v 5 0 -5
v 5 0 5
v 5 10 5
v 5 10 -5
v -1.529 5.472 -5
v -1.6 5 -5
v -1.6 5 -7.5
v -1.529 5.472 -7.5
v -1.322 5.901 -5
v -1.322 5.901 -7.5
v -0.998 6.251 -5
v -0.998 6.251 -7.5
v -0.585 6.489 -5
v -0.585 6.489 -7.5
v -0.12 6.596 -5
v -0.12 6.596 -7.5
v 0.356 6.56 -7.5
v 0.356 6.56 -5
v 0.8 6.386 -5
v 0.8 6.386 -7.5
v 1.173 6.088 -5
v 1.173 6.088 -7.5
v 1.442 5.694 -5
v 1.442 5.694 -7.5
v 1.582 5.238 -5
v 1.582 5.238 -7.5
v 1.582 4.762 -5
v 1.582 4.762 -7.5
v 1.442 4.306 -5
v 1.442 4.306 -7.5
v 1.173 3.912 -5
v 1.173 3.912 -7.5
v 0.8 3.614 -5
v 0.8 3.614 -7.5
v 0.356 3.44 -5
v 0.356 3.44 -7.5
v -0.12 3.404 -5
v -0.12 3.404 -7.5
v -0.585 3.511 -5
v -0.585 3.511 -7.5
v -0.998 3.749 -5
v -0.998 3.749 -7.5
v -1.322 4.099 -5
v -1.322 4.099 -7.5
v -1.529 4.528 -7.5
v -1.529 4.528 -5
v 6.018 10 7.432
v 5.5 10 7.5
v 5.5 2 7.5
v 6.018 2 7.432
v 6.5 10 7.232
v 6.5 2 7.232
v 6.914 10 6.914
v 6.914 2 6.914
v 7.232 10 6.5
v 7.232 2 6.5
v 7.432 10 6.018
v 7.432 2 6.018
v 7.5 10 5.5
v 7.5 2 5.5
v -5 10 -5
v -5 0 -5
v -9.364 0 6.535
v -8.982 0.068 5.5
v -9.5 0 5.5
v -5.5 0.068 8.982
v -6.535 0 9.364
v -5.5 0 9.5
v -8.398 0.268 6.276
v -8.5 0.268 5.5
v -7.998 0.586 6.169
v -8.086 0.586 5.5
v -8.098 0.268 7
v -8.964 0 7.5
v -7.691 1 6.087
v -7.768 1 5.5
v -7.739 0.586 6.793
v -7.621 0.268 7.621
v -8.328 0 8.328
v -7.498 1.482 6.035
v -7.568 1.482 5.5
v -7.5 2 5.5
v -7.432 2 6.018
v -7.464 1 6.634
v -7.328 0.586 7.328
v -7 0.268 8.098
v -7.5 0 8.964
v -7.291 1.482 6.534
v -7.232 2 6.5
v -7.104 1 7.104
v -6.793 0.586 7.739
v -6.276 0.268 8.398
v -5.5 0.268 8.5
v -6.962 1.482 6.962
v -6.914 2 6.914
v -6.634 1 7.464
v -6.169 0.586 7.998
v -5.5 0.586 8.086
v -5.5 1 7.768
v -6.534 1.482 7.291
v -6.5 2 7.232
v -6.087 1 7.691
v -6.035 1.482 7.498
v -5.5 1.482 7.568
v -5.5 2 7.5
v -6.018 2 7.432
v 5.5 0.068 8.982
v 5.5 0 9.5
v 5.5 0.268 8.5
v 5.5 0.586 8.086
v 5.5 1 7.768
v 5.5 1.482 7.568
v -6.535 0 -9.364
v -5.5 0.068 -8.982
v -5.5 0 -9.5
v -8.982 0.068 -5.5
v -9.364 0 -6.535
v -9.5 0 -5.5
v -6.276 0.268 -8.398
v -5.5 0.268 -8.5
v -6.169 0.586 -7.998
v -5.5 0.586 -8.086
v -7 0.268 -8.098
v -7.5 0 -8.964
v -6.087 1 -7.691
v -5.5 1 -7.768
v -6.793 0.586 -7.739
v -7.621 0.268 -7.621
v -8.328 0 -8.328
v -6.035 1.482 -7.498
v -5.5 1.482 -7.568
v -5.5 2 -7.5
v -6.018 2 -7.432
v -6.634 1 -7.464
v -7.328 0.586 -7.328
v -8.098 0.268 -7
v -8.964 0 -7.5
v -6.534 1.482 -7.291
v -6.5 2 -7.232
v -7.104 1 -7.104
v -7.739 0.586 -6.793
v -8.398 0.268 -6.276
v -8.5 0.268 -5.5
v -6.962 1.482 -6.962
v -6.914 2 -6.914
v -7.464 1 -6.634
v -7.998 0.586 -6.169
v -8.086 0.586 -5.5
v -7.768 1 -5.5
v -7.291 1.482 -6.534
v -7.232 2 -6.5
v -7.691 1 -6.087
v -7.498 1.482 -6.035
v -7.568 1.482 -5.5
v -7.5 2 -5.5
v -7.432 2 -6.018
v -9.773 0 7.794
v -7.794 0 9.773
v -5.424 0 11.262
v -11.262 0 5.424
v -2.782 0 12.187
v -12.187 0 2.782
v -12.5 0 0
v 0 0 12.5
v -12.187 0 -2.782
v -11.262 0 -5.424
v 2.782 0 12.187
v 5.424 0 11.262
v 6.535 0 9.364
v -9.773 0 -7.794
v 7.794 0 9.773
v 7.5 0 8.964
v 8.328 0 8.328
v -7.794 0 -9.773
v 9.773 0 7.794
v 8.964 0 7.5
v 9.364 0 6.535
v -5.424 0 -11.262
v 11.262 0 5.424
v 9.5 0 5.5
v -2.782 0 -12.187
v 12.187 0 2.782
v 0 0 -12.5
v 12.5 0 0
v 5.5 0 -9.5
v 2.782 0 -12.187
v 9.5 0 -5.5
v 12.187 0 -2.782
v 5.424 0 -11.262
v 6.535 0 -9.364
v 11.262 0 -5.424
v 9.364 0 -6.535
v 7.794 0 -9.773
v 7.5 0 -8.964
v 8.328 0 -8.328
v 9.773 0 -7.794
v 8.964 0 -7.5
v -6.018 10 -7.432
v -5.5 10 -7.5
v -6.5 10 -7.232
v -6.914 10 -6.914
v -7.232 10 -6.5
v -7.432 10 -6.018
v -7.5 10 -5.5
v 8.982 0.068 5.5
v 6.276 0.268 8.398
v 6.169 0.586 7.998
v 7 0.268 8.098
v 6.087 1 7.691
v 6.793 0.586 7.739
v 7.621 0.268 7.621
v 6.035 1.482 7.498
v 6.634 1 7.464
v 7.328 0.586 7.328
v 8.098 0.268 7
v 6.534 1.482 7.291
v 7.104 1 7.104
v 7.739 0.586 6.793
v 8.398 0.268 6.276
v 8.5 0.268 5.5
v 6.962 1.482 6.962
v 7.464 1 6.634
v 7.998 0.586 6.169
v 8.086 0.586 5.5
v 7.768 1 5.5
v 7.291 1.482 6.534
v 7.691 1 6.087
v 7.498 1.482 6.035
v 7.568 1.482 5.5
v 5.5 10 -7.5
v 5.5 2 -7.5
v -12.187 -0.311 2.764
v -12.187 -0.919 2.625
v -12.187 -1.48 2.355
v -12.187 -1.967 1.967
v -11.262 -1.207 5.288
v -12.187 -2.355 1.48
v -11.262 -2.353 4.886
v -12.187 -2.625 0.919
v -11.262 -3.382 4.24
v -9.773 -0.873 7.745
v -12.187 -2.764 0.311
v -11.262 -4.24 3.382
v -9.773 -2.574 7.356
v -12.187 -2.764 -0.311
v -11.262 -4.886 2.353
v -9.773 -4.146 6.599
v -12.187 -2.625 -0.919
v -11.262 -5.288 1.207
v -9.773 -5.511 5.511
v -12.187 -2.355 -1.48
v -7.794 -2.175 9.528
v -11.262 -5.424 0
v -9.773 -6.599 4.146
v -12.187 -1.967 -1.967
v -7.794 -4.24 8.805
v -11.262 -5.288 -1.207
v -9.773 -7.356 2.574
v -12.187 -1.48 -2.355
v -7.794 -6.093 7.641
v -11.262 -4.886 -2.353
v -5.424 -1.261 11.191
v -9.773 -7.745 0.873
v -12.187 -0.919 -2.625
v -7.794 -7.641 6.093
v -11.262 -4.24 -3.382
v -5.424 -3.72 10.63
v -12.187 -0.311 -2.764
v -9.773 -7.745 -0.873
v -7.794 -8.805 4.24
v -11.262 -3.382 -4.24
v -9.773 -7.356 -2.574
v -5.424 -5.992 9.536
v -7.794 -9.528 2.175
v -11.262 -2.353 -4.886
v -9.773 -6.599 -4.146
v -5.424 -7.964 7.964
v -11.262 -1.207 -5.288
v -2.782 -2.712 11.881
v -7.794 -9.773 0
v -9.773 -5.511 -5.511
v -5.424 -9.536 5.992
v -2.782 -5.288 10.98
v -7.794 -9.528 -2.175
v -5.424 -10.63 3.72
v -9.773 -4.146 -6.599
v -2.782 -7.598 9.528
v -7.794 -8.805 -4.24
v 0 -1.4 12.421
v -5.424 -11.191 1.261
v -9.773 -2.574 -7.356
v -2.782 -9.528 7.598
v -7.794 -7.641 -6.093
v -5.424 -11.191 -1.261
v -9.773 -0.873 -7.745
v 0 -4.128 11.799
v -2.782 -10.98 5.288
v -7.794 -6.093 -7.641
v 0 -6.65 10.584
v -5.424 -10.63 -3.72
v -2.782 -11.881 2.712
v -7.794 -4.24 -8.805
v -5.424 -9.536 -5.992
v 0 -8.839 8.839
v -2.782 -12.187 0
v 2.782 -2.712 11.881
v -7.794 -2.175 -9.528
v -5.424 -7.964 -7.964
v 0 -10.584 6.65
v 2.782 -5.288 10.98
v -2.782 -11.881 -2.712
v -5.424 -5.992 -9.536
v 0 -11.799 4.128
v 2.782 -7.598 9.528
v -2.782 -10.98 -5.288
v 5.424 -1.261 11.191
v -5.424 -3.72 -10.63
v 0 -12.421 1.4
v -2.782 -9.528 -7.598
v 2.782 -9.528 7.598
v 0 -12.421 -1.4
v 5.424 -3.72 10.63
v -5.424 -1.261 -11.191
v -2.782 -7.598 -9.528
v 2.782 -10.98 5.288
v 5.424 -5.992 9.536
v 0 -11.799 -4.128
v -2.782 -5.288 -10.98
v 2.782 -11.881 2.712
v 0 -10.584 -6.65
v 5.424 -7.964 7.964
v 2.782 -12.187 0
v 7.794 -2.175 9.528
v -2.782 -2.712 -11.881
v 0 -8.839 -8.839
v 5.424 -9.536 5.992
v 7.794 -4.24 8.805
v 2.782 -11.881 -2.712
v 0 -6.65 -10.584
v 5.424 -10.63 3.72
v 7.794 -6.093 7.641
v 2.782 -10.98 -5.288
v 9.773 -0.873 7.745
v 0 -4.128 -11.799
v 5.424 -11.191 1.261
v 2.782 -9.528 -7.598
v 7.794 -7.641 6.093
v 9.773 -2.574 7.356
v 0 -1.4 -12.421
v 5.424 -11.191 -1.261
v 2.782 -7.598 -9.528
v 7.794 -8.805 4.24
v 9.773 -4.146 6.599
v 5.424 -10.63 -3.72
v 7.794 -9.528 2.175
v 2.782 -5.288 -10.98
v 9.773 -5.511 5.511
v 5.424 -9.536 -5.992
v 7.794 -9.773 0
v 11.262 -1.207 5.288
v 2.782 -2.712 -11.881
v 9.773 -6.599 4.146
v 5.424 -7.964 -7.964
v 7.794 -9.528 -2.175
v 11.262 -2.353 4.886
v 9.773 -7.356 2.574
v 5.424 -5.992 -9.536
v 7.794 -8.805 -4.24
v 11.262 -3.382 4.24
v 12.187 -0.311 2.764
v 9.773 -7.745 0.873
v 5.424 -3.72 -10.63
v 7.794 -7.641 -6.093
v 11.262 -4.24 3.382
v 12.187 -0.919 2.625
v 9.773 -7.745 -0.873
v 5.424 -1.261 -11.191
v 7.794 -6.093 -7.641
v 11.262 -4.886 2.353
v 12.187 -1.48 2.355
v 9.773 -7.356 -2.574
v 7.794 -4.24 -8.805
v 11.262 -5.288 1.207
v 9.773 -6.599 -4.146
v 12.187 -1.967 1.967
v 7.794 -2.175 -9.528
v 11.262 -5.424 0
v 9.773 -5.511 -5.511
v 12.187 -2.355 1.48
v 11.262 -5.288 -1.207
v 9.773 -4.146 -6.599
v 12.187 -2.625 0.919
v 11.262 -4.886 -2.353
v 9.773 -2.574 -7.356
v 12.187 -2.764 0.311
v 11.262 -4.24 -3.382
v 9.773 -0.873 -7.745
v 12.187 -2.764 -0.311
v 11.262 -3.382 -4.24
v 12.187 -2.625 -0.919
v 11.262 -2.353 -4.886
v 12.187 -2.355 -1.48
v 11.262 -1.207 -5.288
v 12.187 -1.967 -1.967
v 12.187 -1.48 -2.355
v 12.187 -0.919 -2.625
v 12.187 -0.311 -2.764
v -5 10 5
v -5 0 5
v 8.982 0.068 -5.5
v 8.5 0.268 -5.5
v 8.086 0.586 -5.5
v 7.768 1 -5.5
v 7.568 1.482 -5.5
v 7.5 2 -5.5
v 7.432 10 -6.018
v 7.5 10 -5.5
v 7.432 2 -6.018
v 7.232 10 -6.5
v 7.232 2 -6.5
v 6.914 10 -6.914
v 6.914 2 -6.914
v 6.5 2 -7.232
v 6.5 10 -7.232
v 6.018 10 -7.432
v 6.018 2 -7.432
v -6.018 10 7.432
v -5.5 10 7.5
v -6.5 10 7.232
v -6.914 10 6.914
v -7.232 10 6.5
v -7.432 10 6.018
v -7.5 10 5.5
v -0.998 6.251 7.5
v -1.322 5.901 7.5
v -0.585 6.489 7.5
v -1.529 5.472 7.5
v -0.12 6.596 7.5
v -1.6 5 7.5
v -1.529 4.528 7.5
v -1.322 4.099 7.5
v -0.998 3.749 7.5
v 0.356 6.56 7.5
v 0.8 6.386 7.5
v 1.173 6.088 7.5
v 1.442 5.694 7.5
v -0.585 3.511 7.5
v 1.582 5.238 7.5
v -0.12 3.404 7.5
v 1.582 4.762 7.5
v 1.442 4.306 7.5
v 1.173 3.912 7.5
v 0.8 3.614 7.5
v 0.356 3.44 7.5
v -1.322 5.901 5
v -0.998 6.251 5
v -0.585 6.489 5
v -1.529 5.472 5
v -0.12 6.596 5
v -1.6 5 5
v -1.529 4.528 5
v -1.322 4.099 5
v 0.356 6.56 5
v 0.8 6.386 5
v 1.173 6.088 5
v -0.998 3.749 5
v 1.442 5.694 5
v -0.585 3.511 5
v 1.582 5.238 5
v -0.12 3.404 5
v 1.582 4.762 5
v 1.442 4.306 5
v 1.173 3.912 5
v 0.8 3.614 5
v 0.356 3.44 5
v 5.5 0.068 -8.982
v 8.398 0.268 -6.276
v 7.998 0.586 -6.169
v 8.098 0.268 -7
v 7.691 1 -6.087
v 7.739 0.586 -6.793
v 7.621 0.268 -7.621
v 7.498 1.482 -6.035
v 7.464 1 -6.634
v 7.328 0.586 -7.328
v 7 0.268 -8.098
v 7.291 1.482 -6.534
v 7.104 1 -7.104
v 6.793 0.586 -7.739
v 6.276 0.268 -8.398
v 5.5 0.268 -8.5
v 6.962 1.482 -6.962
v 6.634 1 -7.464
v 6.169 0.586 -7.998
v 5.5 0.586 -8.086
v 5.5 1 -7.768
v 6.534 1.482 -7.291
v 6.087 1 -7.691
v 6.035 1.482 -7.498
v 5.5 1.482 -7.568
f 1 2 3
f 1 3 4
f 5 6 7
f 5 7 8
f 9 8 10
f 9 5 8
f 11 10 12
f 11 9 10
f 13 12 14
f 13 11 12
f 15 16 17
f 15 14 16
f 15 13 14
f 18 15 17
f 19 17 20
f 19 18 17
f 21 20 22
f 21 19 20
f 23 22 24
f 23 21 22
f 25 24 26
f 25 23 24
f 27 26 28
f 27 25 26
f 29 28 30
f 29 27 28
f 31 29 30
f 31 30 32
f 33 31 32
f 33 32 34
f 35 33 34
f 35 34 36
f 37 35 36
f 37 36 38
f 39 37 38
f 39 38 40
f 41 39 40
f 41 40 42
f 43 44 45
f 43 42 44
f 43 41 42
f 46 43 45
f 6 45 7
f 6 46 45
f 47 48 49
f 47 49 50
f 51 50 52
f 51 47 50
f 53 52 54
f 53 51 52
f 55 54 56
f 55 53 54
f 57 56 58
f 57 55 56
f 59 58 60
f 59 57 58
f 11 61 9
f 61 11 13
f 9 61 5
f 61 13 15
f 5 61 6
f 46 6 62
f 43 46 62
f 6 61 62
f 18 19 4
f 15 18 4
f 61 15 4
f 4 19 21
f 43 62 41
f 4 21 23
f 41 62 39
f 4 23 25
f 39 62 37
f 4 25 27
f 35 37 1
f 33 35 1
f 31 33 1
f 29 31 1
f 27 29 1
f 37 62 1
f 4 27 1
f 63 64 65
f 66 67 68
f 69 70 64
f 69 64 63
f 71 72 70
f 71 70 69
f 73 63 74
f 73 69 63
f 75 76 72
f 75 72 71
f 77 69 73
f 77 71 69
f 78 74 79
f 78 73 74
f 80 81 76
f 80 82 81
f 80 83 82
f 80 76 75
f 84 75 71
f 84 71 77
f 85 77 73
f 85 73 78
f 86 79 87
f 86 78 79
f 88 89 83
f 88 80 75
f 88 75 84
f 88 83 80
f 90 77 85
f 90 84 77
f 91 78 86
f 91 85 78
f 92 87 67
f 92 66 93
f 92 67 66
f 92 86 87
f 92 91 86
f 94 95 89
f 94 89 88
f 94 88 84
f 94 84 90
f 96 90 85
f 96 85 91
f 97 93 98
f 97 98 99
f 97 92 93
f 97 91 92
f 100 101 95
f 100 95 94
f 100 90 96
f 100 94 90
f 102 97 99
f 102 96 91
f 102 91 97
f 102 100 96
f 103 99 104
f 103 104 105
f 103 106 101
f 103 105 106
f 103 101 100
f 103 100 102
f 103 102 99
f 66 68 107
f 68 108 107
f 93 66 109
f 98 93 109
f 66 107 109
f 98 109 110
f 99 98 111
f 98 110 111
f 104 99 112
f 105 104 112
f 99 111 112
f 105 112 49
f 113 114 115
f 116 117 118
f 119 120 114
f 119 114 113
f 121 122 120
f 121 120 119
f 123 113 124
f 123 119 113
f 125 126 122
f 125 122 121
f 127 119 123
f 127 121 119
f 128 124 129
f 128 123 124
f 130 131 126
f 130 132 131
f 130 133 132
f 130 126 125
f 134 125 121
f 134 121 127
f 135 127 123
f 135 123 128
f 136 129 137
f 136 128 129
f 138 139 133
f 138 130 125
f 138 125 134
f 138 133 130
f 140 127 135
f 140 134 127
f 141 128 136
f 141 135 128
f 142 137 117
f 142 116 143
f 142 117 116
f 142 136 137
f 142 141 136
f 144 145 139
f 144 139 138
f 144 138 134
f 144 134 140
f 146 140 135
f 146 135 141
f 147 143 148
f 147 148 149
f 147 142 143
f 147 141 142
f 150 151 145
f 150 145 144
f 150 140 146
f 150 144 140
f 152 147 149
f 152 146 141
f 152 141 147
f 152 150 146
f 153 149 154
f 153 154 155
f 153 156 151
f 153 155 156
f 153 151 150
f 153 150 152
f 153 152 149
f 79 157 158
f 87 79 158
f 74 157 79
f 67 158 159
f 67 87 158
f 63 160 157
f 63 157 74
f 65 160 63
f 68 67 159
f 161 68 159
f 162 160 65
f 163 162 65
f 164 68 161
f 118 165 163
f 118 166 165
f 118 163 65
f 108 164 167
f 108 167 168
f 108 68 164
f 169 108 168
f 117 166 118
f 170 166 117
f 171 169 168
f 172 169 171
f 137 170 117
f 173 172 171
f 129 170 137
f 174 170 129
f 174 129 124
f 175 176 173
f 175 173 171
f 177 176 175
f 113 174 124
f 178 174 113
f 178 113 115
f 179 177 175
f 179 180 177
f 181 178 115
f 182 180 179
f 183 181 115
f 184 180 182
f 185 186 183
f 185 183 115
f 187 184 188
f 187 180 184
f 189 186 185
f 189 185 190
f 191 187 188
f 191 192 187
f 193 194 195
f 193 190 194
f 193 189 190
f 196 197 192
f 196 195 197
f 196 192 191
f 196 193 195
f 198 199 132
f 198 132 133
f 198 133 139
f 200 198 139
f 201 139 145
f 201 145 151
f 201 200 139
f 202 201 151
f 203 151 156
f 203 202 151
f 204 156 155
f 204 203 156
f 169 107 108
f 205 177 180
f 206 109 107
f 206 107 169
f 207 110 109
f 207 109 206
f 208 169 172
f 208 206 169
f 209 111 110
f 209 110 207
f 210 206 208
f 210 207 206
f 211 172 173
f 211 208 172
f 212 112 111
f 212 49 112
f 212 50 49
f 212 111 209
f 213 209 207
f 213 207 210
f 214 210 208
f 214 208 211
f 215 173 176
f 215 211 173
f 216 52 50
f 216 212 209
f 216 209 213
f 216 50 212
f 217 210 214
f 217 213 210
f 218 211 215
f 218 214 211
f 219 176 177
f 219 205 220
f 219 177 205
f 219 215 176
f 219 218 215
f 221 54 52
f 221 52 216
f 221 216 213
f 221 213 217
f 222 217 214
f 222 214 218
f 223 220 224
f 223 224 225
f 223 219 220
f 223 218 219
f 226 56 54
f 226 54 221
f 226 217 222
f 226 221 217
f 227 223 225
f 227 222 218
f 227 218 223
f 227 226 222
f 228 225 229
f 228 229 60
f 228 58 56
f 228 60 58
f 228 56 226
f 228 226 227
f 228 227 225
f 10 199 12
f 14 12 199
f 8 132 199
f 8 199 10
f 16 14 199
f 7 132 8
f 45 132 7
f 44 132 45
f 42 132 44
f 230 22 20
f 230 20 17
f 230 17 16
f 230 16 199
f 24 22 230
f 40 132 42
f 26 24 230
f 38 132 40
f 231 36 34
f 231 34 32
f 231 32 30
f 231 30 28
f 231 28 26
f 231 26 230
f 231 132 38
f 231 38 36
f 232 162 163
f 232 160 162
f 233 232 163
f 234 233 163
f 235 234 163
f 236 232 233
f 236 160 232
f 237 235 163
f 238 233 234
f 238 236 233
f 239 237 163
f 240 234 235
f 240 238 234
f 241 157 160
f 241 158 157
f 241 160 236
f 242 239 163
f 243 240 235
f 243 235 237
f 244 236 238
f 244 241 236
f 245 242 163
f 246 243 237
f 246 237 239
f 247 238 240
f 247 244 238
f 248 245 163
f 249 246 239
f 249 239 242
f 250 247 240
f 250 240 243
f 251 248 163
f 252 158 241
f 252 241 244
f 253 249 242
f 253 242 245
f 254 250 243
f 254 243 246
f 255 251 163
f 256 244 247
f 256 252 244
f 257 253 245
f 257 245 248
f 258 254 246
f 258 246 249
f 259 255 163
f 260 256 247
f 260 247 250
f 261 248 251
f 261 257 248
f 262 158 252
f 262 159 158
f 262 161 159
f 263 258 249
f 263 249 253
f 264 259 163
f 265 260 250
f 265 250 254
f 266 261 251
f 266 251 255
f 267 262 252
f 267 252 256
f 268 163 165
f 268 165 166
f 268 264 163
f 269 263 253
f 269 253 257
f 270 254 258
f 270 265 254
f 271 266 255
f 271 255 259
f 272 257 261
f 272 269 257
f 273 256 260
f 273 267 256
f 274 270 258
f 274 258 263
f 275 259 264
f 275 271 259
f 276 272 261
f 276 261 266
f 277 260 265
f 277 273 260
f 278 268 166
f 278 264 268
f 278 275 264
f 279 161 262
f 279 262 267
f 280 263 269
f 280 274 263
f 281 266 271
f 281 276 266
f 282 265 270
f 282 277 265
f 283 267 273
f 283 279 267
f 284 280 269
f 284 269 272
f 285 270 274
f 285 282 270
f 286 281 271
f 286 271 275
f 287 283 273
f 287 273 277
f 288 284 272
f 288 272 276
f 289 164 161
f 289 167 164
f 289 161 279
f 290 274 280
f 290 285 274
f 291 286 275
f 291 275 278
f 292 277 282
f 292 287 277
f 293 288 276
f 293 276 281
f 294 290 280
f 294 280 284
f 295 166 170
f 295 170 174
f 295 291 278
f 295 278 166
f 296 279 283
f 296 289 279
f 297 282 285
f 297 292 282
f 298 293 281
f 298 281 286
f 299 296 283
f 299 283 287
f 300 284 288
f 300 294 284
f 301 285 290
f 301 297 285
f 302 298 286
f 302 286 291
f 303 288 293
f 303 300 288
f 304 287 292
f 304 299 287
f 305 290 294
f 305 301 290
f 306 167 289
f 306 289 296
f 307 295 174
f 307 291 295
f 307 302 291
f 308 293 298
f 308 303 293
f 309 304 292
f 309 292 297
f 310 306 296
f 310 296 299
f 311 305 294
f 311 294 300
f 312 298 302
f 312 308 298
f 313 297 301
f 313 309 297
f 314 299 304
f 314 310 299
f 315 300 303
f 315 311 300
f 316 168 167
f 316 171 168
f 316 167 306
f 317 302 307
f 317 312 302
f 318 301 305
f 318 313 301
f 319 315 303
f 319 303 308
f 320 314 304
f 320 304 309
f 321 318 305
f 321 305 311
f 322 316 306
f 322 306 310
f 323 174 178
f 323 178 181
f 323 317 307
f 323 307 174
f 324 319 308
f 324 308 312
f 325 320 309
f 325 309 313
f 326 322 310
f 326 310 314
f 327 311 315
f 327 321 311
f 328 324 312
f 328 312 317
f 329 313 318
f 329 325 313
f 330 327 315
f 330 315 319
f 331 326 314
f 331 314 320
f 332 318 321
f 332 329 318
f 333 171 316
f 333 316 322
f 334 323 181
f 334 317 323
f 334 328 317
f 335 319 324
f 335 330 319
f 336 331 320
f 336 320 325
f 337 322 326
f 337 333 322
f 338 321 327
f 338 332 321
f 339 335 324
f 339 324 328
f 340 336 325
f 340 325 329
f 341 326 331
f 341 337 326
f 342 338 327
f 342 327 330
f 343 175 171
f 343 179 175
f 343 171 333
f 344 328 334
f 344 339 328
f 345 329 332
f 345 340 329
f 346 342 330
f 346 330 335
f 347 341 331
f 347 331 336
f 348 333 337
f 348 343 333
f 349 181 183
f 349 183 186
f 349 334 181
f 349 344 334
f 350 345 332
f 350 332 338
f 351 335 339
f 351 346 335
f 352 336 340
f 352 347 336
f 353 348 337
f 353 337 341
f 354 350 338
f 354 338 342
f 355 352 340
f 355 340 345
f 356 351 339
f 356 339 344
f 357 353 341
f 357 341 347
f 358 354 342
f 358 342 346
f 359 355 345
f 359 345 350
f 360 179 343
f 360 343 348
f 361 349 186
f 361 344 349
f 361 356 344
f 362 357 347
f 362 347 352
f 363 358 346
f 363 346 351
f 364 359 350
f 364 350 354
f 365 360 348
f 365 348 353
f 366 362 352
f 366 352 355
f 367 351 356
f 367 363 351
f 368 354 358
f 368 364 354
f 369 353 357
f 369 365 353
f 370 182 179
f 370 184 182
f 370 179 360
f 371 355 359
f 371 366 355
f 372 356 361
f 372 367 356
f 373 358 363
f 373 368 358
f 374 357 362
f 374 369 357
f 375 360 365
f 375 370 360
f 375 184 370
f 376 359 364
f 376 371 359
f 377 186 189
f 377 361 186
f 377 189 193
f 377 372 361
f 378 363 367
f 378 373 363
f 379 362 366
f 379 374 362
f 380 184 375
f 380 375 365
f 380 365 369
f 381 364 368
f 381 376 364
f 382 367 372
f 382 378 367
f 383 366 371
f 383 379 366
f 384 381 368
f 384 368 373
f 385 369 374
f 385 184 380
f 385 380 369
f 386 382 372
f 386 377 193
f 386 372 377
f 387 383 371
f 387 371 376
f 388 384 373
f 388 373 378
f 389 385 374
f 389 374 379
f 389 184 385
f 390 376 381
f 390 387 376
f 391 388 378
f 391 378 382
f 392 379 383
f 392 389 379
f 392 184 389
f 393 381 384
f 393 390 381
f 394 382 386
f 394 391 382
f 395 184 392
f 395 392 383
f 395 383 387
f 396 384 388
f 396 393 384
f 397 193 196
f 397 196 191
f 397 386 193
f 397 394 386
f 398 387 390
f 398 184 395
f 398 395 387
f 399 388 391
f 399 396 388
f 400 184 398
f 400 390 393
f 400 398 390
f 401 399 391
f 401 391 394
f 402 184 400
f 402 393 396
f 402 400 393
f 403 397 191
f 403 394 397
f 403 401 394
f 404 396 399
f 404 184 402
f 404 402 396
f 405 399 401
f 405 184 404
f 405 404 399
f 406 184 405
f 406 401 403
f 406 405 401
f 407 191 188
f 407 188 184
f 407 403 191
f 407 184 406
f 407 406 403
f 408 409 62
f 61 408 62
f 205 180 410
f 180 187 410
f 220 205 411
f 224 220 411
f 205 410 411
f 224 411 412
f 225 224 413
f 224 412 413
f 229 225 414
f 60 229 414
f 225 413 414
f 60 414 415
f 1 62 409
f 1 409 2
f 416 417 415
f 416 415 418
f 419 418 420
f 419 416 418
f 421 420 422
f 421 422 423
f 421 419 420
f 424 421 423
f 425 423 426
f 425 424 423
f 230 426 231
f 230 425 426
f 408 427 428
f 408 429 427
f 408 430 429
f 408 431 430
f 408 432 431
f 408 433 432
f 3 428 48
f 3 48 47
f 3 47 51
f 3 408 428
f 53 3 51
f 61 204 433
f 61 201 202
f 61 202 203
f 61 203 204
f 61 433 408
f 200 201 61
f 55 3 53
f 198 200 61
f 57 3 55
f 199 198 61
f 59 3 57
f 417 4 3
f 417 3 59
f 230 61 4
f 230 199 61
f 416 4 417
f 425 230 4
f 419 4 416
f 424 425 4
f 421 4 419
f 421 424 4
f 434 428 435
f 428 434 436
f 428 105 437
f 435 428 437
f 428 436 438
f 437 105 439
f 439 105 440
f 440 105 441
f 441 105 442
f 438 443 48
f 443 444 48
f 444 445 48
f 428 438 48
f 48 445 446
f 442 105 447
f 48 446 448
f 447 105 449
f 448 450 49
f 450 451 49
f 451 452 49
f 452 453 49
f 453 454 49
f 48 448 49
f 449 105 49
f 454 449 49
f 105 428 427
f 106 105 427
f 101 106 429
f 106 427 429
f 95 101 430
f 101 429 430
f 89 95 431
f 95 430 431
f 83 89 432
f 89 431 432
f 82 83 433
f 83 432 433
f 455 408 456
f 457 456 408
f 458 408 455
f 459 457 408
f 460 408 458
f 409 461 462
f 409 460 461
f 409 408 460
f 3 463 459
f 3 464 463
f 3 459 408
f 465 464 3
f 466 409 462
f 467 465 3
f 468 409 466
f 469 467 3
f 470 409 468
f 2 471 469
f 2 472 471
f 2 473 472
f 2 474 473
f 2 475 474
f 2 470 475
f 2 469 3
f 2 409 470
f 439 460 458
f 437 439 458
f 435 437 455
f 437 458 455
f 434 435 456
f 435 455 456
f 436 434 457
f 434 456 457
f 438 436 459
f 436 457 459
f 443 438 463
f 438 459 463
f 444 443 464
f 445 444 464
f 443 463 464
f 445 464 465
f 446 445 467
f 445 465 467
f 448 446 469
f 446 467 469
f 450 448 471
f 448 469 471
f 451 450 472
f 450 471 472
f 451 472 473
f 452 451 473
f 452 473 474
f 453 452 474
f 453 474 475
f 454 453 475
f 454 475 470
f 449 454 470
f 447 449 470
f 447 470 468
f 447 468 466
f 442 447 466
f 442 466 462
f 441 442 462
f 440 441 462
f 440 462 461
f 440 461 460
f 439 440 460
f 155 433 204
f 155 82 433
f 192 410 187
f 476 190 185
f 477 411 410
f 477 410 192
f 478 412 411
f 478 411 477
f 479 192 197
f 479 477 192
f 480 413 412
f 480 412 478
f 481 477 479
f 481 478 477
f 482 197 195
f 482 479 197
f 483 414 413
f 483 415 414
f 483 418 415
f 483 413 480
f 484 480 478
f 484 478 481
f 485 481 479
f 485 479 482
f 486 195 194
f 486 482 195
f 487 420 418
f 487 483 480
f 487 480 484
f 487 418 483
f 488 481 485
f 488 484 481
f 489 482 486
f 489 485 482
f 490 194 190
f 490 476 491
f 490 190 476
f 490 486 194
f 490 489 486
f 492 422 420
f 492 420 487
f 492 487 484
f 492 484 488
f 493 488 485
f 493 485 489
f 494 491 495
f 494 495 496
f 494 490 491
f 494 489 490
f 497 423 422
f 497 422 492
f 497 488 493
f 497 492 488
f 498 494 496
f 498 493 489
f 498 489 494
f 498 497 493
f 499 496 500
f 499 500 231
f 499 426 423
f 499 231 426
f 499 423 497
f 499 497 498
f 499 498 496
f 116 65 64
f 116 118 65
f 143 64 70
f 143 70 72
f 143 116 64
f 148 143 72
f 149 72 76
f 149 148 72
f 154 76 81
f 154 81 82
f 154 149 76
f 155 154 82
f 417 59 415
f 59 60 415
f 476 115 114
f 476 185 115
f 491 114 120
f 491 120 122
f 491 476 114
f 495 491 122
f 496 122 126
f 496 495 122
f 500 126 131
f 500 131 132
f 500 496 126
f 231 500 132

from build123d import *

# Parameters (mm, degrees)
REVOLVE2_ANGLE          = 180
SKETCH1_W               = 15
SKETCH1_H               = 15
SKETCH1_W_2             = 10
SKETCH1_H_2             = 10
BOSS_EXTRUDE1_DEPTH     = 10
SKETCH2_R               = 1.6
CUT_EXTRUDE1_DEPTH      = 20
CUT_EXTRUDE1_DEPTH_BACK = 10
FILLET1_R               = 2


with BuildPart() as part:
    # Sketch4 → Revolve2 (revolve)
    with BuildSketch(Plane(origin=(0, 0, 0), x_dir=(1, 0, 0), z_dir=(0, 1, 0))):
        with BuildLine():
            Line((12.5, 0), (-12.5, 0))
            ThreePointArc((-12.5, 0), (0, -12.5), (12.5, 0))
        make_face()
    revolve(axis=Axis((-12.5, 0, 0), (1, 0, 0)), revolution_arc=REVOLVE2_ANGLE)

    # Sketch1 → Boss-Extrude1 (add)
    with BuildSketch(Plane(origin=(0, 0, 0), x_dir=(1, 0, 0), z_dir=(0, 1, 0))):
        Rectangle(SKETCH1_W, SKETCH1_H)
        Rectangle(SKETCH1_W_2, SKETCH1_H_2, mode=Mode.SUBTRACT)
    extrude(amount=BOSS_EXTRUDE1_DEPTH)

    # Sketch2 → Cut-Extrude1 (cut, two sides)
    with BuildSketch(Plane(origin=(0, 0, 5), x_dir=(-1, 0, 0), z_dir=(0, 0, -1))) as cut_extrude1_sk:
        with Locations((0, 5)):
            Circle(SKETCH2_R)
    extrude(amount=CUT_EXTRUDE1_DEPTH, mode=Mode.SUBTRACT)
    extrude(cut_extrude1_sk.sketch, amount=-CUT_EXTRUDE1_DEPTH_BACK, mode=Mode.SUBTRACT)

    # Fillet1
    fillet1_edges = [part.edges().sort_by_distance(p)[0] for p in [
        (7.5, 0, 0),
        (7.5, 5, 7.5),
        (0, 0, -7.5),
        (7.5, 5, -7.5),
        (-7.5, 0, 0),
        (-7.5, 5, -7.5),
        (0, 0, 7.5),
        (-7.5, 5, 7.5),
    ]]
    fillet(fillet1_edges, radius=FILLET1_R)


solid = part.part
